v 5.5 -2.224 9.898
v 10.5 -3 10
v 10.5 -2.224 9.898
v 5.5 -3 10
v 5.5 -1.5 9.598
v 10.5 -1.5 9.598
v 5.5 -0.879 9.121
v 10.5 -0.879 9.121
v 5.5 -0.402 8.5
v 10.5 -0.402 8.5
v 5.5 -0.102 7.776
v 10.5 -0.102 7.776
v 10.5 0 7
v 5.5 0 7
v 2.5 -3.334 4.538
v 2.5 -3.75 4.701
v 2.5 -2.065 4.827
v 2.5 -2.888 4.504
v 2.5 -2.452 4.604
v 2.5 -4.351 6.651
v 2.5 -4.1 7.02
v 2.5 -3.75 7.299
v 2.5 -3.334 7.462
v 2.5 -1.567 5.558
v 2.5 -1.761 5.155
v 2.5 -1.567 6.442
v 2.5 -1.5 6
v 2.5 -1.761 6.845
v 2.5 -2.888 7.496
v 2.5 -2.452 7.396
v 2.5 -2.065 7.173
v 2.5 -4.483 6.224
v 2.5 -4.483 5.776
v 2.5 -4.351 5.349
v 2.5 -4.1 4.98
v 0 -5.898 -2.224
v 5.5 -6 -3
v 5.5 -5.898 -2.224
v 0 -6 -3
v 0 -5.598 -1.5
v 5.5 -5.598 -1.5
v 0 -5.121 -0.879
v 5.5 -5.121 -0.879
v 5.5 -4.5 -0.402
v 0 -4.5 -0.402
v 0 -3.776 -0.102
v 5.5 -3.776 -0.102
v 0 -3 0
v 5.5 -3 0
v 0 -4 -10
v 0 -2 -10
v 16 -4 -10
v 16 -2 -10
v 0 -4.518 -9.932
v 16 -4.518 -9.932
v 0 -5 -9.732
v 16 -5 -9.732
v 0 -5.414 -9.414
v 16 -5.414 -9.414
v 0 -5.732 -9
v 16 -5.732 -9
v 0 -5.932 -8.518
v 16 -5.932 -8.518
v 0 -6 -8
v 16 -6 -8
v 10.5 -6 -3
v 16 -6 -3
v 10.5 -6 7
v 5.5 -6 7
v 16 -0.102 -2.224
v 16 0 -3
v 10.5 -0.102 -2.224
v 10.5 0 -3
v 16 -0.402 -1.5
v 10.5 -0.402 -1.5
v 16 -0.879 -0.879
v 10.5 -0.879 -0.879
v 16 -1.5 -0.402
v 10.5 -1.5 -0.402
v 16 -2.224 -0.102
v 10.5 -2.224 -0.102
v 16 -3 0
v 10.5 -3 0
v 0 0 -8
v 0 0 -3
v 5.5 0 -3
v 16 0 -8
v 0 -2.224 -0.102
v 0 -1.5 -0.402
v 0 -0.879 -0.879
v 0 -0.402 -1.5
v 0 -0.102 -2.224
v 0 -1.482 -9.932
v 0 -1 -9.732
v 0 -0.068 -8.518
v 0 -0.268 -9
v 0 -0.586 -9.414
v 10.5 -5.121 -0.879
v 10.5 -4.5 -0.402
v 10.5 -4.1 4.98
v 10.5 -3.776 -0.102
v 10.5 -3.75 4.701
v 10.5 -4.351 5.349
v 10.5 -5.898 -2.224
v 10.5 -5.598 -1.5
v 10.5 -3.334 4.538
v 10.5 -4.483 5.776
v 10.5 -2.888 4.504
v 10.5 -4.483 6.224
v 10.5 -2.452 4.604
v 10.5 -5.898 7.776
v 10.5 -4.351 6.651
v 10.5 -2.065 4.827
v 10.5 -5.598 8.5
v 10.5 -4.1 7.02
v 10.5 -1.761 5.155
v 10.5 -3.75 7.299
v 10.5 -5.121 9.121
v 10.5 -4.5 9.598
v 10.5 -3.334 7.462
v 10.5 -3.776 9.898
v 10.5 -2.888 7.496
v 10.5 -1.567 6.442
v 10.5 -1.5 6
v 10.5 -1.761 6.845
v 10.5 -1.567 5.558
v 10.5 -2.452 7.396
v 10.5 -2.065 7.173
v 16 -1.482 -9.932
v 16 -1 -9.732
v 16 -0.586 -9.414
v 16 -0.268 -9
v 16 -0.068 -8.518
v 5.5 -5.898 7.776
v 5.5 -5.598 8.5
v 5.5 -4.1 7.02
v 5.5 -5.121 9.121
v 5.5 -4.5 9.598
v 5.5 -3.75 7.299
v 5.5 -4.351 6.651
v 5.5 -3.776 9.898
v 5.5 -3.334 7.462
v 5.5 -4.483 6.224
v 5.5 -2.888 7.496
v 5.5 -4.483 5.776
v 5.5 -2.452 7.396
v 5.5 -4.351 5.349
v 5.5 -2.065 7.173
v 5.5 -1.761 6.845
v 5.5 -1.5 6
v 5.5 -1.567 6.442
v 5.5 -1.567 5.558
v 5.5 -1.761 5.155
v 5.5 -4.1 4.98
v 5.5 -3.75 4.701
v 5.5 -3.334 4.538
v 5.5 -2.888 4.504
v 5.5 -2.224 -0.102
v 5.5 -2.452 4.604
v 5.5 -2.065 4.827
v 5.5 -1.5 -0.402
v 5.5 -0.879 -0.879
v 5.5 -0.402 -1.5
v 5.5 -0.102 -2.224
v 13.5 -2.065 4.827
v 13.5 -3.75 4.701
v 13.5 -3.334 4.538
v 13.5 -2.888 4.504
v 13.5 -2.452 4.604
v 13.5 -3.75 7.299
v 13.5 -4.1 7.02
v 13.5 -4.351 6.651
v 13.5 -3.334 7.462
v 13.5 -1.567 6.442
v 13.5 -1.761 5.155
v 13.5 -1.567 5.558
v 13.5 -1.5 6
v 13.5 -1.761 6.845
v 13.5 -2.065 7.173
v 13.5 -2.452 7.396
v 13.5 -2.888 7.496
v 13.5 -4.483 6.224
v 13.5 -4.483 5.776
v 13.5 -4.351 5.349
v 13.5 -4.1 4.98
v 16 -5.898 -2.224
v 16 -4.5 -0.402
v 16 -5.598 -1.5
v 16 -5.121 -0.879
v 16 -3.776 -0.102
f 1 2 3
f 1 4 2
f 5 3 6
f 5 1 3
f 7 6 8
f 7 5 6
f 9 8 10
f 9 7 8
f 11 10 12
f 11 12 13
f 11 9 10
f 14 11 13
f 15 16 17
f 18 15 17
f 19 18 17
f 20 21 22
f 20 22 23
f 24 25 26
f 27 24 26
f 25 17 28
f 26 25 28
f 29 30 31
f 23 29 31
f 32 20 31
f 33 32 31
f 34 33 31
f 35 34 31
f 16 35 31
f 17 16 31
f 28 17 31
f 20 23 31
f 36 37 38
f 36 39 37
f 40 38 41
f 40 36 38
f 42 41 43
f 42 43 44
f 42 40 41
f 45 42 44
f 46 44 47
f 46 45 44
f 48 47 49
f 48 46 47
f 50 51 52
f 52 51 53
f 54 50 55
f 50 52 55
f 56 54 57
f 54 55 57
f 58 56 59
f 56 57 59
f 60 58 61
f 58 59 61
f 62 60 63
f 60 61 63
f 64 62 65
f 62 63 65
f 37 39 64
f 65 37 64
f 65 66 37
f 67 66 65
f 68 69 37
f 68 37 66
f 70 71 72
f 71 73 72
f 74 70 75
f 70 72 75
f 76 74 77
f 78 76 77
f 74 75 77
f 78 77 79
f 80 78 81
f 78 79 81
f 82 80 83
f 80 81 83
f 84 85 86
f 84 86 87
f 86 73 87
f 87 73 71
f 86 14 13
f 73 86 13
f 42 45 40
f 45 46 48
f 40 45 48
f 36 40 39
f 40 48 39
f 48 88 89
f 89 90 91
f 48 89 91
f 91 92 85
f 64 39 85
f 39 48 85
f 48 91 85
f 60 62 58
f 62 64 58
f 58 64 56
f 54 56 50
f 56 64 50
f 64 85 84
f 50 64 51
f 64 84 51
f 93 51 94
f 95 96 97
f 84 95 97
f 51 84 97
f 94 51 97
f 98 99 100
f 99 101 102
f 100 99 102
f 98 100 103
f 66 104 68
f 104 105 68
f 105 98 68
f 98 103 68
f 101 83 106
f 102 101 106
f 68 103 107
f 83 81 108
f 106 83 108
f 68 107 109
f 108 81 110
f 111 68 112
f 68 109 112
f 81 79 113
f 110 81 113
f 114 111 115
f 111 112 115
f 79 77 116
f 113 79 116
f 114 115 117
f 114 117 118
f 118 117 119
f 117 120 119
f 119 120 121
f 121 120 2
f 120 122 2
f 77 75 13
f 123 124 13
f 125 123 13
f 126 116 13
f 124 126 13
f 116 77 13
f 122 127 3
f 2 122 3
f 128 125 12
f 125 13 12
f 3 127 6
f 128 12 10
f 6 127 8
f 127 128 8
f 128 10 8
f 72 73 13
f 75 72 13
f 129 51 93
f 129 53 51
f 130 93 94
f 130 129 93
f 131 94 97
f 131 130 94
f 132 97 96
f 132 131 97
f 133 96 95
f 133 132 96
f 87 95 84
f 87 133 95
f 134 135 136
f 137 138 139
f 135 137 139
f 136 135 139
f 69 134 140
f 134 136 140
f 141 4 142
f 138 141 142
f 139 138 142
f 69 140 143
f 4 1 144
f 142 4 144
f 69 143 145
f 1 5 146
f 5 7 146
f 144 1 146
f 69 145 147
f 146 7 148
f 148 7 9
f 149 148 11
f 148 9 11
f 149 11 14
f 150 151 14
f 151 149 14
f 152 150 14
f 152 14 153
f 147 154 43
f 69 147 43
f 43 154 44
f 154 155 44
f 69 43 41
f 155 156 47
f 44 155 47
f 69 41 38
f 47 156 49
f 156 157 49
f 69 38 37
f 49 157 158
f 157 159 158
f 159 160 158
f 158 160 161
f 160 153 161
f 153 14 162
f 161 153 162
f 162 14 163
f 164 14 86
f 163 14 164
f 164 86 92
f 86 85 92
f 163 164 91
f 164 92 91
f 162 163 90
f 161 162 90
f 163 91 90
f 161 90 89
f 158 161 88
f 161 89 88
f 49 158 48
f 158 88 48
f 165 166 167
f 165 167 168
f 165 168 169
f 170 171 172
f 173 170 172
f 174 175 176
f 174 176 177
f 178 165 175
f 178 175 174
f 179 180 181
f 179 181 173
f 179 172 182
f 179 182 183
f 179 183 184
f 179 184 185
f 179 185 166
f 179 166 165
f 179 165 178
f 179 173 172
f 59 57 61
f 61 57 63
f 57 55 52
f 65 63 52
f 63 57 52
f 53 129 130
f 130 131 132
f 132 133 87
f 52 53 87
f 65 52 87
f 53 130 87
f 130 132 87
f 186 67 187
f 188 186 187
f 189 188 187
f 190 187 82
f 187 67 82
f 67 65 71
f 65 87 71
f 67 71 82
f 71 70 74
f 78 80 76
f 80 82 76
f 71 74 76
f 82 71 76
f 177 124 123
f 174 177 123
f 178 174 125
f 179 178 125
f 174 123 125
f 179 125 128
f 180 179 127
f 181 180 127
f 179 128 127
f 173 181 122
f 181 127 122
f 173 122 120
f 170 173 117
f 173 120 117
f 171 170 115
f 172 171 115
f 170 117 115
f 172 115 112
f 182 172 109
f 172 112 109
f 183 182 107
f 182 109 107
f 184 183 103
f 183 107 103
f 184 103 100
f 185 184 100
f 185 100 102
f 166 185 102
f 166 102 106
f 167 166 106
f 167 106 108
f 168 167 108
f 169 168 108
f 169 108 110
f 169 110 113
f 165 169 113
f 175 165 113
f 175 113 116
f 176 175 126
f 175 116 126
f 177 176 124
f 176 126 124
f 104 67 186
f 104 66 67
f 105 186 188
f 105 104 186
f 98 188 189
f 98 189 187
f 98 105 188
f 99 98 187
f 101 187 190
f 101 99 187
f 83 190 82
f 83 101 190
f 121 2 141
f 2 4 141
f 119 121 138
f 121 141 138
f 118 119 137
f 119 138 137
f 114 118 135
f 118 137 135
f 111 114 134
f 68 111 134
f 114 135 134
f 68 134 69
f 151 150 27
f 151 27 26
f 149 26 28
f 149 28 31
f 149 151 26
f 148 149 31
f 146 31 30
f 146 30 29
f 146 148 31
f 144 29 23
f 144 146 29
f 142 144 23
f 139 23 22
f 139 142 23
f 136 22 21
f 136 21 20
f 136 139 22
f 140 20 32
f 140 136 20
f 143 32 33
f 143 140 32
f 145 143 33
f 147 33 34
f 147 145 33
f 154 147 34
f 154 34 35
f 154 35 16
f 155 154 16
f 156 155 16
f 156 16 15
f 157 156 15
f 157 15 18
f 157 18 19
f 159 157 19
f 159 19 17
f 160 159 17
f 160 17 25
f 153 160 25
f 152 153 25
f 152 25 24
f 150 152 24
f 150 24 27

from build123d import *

# Parameters (mm, degrees)
F1_DEPTH      = 6
F2_R          = 1.5
F3_DEPTH      = 3
F3_DEPTH_BACK = 8
F4_R          = 2.99999
F5_R          = 2.99999
F6_R          = 2


# Not quite as in the source:
# - a fillet or chamfer is up to 0.001 mm smaller than in the source, because OpenCascade refuses the exact size


with BuildPart() as f1:
    # F0 (on Front) → F1 (new body)
    with BuildSketch(Plane.XZ):
        Polygon((5.5, 0), (0, 0), (0, -10), (16, -10), (16, 0), (10.5, 0), (10.5, 10), (5.5, 10), align=None)
    extrude(amount=F1_DEPTH)

    # F2 (on face) → F3 (join, two sides)
    with BuildSketch(Plane.YZ.offset(10.5)) as f3_sk:
        with Locations((-3, 6)):
            Circle(F2_R)
    extrude(amount=F3_DEPTH)
    extrude(f3_sk.sketch, amount=-F3_DEPTH_BACK)

    # F4 (radius 3 in the source; OpenCascade refuses exactly that, so slightly less here)
    f4_edges = [f1.edges().sort_by_distance(p)[0] for p in [
        (8, -6, 10),
        (8, 0, 10),
    ]]
    fillet(f4_edges, radius=F4_R)

    # F5 (radius 3 in the source; OpenCascade refuses exactly that, so slightly less here)
    f5_edges = [f1.edges().sort_by_distance(p)[0] for p in [
        (2.75, -6, 0),
        (2.75, 0, 0),
        (13.25, -6, 0),
        (13.25, 0, 0),
    ]]
    fillet(f5_edges, radius=F5_R)

    # F6
    f6_edges = [f1.edges().sort_by_distance(p)[0] for p in [
        (8, -6, -10),
        (8, 0, -10),
    ]]
    fillet(f6_edges, radius=F6_R)


solid = f1.part
